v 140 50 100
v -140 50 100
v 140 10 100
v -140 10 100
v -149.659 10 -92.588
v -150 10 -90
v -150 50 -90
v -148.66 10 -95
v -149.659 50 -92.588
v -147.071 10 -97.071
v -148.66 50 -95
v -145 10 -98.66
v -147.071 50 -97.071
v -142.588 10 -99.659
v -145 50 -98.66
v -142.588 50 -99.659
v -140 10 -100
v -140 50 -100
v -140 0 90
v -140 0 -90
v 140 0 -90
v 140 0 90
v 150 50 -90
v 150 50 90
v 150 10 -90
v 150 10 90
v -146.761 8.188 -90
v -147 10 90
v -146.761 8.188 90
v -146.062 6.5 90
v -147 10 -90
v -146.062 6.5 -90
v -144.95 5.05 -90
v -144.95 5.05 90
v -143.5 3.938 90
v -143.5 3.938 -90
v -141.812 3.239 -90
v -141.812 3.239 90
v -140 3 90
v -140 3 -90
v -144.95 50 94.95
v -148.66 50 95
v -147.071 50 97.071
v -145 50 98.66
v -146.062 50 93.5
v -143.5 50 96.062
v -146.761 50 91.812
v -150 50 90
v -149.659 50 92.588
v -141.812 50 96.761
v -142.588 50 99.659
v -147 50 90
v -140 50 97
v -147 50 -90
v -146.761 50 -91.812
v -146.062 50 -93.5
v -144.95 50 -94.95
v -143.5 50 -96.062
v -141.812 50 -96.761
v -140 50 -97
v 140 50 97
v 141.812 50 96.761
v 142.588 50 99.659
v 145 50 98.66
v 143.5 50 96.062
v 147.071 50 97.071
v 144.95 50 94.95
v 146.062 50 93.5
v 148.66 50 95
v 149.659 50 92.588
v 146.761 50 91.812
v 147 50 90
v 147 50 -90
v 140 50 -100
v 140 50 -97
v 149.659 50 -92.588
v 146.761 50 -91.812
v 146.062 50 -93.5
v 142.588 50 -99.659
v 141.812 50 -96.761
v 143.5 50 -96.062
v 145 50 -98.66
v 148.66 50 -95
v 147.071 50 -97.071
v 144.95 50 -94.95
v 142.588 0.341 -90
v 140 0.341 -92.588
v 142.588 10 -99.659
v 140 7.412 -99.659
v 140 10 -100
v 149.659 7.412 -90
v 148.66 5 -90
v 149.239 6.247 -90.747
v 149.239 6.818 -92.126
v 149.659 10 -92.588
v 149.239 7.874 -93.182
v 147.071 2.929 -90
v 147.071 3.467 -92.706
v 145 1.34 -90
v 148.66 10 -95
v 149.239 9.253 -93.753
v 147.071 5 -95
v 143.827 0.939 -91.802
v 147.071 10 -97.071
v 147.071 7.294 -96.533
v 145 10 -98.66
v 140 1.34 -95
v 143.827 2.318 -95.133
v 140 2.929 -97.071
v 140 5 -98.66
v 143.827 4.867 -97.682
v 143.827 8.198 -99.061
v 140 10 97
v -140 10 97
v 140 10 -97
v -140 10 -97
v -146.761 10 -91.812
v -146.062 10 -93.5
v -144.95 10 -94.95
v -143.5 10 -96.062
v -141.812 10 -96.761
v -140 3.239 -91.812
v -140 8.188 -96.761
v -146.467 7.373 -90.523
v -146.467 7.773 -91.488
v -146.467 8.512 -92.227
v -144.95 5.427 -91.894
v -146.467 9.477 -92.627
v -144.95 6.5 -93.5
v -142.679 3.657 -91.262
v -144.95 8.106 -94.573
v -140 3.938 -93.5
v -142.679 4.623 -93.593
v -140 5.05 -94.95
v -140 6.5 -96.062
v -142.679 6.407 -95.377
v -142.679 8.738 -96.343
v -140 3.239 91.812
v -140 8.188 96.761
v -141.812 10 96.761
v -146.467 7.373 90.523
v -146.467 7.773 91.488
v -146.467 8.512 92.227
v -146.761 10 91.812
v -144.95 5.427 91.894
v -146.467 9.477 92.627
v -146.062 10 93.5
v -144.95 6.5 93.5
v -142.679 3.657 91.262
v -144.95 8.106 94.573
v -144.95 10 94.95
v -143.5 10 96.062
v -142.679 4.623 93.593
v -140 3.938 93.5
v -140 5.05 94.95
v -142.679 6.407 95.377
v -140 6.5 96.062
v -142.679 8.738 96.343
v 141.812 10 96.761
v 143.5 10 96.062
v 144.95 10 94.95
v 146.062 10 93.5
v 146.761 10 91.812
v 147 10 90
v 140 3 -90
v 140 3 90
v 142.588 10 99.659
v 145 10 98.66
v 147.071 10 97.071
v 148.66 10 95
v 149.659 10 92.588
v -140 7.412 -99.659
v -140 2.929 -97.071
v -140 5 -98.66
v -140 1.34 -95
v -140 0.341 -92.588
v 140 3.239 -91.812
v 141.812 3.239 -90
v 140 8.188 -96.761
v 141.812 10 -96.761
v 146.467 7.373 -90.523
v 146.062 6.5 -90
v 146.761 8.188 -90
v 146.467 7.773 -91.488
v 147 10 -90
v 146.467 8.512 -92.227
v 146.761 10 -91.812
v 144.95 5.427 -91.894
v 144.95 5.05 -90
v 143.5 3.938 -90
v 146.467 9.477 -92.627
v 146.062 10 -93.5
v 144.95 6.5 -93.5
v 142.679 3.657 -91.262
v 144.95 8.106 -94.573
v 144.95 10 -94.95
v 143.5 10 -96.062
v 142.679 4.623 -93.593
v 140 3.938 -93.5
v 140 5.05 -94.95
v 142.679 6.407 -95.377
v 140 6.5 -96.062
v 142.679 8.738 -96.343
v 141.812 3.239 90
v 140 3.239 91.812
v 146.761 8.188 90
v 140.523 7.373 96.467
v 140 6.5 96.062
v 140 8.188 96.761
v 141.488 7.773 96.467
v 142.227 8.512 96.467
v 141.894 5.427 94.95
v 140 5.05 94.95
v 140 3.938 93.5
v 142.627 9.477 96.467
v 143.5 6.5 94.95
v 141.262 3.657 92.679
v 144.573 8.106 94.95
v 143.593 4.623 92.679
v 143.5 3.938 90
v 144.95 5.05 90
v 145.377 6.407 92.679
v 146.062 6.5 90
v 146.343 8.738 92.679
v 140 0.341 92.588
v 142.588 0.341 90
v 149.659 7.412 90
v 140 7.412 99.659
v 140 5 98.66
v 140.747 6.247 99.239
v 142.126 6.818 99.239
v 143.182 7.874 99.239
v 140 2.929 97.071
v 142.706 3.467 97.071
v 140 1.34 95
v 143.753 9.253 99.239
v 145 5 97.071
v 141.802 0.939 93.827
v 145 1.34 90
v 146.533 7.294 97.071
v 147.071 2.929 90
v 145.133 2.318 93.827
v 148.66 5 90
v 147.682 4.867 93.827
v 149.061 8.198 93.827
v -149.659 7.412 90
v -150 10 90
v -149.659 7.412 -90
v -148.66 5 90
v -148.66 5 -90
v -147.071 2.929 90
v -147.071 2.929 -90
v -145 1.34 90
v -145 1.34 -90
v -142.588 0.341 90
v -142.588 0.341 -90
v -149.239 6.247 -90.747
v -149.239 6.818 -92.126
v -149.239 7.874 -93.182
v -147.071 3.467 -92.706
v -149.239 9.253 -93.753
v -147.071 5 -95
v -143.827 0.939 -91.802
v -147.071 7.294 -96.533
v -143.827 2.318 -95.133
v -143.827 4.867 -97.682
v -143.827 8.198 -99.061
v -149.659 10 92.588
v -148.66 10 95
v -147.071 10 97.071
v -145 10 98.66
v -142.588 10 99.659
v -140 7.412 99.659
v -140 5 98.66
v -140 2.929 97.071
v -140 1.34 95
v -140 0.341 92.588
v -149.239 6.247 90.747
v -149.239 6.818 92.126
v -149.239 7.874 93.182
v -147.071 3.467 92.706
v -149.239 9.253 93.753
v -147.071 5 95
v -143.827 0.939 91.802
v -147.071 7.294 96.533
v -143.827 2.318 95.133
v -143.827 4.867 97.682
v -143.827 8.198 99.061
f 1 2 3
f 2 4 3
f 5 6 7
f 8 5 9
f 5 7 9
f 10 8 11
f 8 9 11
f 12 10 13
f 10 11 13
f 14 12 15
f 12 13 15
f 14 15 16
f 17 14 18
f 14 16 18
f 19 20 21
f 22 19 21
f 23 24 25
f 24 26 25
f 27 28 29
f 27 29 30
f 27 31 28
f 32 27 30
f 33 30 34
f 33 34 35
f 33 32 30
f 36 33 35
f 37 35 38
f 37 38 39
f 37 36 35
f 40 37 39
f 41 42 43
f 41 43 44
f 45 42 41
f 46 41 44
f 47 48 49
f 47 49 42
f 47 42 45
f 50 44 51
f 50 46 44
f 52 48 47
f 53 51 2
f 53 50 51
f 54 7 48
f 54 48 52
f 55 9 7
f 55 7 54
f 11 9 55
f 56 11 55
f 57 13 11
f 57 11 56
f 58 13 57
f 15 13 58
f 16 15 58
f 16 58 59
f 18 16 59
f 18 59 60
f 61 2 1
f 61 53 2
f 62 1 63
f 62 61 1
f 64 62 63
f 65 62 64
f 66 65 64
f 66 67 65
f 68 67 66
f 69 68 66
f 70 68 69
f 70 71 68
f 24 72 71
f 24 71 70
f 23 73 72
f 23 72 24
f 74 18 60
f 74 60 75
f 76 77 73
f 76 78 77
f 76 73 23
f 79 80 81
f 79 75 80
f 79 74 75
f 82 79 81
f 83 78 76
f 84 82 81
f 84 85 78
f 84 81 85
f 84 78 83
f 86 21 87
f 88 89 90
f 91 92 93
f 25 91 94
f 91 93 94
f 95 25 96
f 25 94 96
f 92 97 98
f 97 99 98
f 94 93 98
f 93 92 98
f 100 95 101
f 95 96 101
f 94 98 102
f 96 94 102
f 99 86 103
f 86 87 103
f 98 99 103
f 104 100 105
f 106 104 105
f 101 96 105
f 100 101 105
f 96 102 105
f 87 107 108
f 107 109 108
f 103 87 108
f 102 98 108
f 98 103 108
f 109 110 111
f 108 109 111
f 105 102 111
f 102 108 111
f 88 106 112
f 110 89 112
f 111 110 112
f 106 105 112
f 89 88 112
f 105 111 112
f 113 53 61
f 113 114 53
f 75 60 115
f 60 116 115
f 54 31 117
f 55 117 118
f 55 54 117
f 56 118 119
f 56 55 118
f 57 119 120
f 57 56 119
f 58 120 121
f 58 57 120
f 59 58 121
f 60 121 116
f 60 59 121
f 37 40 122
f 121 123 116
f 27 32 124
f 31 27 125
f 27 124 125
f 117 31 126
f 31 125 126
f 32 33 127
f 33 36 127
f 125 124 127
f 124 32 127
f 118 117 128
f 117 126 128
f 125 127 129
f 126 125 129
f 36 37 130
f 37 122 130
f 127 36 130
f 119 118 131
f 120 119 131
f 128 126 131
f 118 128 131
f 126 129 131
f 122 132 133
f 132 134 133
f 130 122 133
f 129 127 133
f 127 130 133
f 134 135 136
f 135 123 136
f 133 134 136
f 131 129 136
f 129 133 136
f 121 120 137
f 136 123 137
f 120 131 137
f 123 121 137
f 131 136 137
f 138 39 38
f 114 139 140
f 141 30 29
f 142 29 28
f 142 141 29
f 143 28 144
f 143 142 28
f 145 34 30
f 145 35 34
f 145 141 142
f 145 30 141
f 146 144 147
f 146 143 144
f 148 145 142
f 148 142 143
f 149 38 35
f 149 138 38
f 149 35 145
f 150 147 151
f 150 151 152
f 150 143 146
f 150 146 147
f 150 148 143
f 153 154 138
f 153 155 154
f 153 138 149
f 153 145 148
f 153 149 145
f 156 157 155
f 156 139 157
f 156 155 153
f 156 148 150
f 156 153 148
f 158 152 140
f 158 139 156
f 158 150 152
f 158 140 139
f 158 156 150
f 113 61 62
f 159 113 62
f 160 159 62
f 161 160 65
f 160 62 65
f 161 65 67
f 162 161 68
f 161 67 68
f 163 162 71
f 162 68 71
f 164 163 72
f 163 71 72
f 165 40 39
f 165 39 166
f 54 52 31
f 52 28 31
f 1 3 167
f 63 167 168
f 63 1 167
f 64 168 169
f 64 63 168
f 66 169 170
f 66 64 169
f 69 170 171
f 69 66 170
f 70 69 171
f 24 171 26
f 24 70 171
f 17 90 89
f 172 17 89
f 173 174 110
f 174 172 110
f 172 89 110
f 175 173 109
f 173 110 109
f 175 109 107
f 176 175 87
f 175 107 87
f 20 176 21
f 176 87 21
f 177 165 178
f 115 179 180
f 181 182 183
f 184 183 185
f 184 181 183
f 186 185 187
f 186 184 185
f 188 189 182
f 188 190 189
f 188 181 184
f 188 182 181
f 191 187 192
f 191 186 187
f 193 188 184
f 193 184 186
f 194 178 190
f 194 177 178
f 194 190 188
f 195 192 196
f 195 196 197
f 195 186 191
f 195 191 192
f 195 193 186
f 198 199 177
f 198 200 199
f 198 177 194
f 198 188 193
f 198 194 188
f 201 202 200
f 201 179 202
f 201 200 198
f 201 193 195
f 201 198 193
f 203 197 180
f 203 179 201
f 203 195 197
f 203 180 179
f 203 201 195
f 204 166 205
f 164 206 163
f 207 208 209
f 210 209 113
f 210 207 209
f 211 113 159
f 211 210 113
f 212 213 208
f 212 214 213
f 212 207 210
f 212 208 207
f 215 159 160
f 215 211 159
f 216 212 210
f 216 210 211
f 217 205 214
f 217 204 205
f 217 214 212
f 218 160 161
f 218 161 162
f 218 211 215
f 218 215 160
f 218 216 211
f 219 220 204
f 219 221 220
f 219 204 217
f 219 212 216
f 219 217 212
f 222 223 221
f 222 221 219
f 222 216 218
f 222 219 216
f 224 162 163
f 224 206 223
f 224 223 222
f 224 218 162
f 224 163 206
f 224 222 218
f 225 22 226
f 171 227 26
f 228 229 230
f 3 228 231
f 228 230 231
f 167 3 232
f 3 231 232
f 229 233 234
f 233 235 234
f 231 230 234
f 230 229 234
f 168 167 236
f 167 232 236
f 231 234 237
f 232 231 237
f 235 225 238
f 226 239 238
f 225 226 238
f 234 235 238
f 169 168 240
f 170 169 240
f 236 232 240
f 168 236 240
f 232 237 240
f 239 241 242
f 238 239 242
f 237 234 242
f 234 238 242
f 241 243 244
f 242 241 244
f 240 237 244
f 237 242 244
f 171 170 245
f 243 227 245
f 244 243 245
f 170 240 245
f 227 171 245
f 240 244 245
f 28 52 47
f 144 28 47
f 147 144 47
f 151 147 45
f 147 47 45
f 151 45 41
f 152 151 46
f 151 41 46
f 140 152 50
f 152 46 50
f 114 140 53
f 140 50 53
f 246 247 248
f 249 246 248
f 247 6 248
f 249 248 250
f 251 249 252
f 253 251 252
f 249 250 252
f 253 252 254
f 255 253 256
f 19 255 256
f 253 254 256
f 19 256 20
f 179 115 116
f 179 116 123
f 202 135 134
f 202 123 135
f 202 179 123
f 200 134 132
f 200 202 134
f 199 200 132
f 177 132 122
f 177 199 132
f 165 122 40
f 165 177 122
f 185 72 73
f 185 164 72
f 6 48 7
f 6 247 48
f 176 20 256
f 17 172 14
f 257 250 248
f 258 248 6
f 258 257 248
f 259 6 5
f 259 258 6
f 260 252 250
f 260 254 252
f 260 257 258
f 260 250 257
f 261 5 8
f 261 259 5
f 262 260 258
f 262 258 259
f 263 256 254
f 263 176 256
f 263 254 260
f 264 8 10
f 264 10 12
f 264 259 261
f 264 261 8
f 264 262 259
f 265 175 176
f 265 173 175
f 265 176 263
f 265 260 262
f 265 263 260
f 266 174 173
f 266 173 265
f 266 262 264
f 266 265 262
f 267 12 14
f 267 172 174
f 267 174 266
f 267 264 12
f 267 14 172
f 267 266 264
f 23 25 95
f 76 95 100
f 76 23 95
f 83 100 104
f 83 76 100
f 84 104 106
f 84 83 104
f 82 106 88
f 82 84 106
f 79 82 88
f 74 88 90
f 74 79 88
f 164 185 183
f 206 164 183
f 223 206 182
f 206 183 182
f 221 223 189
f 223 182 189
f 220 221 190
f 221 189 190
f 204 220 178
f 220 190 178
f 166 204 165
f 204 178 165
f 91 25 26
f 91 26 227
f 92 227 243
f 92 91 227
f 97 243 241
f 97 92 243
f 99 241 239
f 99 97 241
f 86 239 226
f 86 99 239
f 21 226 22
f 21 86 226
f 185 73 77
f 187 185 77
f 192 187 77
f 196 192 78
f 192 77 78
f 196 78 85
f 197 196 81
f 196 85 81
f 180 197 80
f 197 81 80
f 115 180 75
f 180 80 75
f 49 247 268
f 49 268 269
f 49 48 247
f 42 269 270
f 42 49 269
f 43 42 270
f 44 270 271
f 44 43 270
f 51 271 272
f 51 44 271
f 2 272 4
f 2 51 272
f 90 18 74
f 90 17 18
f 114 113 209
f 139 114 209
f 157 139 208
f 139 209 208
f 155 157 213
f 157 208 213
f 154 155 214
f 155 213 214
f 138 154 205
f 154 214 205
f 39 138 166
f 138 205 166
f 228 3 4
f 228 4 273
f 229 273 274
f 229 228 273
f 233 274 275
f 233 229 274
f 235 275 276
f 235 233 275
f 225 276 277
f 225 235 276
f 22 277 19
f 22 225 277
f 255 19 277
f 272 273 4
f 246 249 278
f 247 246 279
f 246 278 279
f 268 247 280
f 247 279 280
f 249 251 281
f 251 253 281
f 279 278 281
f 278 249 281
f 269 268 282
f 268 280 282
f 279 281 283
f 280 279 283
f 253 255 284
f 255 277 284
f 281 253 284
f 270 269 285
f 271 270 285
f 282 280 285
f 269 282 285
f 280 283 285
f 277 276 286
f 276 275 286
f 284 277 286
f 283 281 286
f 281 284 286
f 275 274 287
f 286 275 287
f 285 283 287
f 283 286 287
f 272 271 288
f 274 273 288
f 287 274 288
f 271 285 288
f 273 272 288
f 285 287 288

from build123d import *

# Parameters (mm, degrees)
SKETCH1_W           = 300
SKETCH1_H           = 200
BOSS_EXTRUDE1_DEPTH = 50
FILLET1_R           = 10
SHELL1_T            = -3


with BuildPart() as part:
    # Sketch1 → Boss-Extrude1 (new body)
    with BuildSketch(Plane(origin=(0, 0, 0), x_dir=(1, 0, 0), z_dir=(0, 1, 0))):
        Rectangle(SKETCH1_W, SKETCH1_H)
    extrude(amount=BOSS_EXTRUDE1_DEPTH)

    # Fillet1
    fillet1_edges = [part.edges().sort_by_distance(p)[0] for p in [
        (0, 0, -100),
        (150, 0, 0),
        (0, 0, 100),
        (-150, 0, 0),
        (-150, 25, -100),
        (150, 25, -100),
        (150, 25, 100),
        (-150, 25, 100),
    ]]
    fillet(fillet1_edges, radius=FILLET1_R)

    # Shell1
    shell1_openings = [part.faces().sort_by_distance(p)[0] for p in [
        (0, 50, 0),
    ]]
    offset(amount=SHELL1_T, openings=shell1_openings, kind=Kind.INTERSECTION)


solid = part.part
